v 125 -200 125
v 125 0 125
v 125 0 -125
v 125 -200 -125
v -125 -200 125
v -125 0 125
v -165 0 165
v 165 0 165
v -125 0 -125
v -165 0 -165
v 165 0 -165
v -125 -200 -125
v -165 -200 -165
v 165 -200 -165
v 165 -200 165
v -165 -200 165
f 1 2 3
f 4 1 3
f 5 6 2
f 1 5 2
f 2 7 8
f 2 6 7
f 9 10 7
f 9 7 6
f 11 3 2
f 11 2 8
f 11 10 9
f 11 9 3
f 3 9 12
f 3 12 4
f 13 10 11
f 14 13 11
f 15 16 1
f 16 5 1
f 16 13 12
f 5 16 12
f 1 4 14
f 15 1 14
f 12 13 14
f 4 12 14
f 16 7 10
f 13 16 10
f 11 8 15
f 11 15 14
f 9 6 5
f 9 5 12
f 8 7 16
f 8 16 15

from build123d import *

# Parameters (mm, degrees)
ESQUISSE1_W        = 330
ESQUISSE1_H        = 330
ESQUISSE1_W_2      = 250
ESQUISSE1_H_2      = 250
BOSS_EXTRU_1_DEPTH = 200


with BuildPart() as part:
    # Esquisse1 → Boss.-Extru.1 (new body)
    with BuildSketch(Plane(origin=(0, 0, 0), x_dir=(1, 0, 0), z_dir=(0, 1, 0))):
        Rectangle(ESQUISSE1_W, ESQUISSE1_H)
        Rectangle(ESQUISSE1_W_2, ESQUISSE1_H_2, mode=Mode.SUBTRACT)
    extrude(amount=-BOSS_EXTRU_1_DEPTH)


solid = part.part
